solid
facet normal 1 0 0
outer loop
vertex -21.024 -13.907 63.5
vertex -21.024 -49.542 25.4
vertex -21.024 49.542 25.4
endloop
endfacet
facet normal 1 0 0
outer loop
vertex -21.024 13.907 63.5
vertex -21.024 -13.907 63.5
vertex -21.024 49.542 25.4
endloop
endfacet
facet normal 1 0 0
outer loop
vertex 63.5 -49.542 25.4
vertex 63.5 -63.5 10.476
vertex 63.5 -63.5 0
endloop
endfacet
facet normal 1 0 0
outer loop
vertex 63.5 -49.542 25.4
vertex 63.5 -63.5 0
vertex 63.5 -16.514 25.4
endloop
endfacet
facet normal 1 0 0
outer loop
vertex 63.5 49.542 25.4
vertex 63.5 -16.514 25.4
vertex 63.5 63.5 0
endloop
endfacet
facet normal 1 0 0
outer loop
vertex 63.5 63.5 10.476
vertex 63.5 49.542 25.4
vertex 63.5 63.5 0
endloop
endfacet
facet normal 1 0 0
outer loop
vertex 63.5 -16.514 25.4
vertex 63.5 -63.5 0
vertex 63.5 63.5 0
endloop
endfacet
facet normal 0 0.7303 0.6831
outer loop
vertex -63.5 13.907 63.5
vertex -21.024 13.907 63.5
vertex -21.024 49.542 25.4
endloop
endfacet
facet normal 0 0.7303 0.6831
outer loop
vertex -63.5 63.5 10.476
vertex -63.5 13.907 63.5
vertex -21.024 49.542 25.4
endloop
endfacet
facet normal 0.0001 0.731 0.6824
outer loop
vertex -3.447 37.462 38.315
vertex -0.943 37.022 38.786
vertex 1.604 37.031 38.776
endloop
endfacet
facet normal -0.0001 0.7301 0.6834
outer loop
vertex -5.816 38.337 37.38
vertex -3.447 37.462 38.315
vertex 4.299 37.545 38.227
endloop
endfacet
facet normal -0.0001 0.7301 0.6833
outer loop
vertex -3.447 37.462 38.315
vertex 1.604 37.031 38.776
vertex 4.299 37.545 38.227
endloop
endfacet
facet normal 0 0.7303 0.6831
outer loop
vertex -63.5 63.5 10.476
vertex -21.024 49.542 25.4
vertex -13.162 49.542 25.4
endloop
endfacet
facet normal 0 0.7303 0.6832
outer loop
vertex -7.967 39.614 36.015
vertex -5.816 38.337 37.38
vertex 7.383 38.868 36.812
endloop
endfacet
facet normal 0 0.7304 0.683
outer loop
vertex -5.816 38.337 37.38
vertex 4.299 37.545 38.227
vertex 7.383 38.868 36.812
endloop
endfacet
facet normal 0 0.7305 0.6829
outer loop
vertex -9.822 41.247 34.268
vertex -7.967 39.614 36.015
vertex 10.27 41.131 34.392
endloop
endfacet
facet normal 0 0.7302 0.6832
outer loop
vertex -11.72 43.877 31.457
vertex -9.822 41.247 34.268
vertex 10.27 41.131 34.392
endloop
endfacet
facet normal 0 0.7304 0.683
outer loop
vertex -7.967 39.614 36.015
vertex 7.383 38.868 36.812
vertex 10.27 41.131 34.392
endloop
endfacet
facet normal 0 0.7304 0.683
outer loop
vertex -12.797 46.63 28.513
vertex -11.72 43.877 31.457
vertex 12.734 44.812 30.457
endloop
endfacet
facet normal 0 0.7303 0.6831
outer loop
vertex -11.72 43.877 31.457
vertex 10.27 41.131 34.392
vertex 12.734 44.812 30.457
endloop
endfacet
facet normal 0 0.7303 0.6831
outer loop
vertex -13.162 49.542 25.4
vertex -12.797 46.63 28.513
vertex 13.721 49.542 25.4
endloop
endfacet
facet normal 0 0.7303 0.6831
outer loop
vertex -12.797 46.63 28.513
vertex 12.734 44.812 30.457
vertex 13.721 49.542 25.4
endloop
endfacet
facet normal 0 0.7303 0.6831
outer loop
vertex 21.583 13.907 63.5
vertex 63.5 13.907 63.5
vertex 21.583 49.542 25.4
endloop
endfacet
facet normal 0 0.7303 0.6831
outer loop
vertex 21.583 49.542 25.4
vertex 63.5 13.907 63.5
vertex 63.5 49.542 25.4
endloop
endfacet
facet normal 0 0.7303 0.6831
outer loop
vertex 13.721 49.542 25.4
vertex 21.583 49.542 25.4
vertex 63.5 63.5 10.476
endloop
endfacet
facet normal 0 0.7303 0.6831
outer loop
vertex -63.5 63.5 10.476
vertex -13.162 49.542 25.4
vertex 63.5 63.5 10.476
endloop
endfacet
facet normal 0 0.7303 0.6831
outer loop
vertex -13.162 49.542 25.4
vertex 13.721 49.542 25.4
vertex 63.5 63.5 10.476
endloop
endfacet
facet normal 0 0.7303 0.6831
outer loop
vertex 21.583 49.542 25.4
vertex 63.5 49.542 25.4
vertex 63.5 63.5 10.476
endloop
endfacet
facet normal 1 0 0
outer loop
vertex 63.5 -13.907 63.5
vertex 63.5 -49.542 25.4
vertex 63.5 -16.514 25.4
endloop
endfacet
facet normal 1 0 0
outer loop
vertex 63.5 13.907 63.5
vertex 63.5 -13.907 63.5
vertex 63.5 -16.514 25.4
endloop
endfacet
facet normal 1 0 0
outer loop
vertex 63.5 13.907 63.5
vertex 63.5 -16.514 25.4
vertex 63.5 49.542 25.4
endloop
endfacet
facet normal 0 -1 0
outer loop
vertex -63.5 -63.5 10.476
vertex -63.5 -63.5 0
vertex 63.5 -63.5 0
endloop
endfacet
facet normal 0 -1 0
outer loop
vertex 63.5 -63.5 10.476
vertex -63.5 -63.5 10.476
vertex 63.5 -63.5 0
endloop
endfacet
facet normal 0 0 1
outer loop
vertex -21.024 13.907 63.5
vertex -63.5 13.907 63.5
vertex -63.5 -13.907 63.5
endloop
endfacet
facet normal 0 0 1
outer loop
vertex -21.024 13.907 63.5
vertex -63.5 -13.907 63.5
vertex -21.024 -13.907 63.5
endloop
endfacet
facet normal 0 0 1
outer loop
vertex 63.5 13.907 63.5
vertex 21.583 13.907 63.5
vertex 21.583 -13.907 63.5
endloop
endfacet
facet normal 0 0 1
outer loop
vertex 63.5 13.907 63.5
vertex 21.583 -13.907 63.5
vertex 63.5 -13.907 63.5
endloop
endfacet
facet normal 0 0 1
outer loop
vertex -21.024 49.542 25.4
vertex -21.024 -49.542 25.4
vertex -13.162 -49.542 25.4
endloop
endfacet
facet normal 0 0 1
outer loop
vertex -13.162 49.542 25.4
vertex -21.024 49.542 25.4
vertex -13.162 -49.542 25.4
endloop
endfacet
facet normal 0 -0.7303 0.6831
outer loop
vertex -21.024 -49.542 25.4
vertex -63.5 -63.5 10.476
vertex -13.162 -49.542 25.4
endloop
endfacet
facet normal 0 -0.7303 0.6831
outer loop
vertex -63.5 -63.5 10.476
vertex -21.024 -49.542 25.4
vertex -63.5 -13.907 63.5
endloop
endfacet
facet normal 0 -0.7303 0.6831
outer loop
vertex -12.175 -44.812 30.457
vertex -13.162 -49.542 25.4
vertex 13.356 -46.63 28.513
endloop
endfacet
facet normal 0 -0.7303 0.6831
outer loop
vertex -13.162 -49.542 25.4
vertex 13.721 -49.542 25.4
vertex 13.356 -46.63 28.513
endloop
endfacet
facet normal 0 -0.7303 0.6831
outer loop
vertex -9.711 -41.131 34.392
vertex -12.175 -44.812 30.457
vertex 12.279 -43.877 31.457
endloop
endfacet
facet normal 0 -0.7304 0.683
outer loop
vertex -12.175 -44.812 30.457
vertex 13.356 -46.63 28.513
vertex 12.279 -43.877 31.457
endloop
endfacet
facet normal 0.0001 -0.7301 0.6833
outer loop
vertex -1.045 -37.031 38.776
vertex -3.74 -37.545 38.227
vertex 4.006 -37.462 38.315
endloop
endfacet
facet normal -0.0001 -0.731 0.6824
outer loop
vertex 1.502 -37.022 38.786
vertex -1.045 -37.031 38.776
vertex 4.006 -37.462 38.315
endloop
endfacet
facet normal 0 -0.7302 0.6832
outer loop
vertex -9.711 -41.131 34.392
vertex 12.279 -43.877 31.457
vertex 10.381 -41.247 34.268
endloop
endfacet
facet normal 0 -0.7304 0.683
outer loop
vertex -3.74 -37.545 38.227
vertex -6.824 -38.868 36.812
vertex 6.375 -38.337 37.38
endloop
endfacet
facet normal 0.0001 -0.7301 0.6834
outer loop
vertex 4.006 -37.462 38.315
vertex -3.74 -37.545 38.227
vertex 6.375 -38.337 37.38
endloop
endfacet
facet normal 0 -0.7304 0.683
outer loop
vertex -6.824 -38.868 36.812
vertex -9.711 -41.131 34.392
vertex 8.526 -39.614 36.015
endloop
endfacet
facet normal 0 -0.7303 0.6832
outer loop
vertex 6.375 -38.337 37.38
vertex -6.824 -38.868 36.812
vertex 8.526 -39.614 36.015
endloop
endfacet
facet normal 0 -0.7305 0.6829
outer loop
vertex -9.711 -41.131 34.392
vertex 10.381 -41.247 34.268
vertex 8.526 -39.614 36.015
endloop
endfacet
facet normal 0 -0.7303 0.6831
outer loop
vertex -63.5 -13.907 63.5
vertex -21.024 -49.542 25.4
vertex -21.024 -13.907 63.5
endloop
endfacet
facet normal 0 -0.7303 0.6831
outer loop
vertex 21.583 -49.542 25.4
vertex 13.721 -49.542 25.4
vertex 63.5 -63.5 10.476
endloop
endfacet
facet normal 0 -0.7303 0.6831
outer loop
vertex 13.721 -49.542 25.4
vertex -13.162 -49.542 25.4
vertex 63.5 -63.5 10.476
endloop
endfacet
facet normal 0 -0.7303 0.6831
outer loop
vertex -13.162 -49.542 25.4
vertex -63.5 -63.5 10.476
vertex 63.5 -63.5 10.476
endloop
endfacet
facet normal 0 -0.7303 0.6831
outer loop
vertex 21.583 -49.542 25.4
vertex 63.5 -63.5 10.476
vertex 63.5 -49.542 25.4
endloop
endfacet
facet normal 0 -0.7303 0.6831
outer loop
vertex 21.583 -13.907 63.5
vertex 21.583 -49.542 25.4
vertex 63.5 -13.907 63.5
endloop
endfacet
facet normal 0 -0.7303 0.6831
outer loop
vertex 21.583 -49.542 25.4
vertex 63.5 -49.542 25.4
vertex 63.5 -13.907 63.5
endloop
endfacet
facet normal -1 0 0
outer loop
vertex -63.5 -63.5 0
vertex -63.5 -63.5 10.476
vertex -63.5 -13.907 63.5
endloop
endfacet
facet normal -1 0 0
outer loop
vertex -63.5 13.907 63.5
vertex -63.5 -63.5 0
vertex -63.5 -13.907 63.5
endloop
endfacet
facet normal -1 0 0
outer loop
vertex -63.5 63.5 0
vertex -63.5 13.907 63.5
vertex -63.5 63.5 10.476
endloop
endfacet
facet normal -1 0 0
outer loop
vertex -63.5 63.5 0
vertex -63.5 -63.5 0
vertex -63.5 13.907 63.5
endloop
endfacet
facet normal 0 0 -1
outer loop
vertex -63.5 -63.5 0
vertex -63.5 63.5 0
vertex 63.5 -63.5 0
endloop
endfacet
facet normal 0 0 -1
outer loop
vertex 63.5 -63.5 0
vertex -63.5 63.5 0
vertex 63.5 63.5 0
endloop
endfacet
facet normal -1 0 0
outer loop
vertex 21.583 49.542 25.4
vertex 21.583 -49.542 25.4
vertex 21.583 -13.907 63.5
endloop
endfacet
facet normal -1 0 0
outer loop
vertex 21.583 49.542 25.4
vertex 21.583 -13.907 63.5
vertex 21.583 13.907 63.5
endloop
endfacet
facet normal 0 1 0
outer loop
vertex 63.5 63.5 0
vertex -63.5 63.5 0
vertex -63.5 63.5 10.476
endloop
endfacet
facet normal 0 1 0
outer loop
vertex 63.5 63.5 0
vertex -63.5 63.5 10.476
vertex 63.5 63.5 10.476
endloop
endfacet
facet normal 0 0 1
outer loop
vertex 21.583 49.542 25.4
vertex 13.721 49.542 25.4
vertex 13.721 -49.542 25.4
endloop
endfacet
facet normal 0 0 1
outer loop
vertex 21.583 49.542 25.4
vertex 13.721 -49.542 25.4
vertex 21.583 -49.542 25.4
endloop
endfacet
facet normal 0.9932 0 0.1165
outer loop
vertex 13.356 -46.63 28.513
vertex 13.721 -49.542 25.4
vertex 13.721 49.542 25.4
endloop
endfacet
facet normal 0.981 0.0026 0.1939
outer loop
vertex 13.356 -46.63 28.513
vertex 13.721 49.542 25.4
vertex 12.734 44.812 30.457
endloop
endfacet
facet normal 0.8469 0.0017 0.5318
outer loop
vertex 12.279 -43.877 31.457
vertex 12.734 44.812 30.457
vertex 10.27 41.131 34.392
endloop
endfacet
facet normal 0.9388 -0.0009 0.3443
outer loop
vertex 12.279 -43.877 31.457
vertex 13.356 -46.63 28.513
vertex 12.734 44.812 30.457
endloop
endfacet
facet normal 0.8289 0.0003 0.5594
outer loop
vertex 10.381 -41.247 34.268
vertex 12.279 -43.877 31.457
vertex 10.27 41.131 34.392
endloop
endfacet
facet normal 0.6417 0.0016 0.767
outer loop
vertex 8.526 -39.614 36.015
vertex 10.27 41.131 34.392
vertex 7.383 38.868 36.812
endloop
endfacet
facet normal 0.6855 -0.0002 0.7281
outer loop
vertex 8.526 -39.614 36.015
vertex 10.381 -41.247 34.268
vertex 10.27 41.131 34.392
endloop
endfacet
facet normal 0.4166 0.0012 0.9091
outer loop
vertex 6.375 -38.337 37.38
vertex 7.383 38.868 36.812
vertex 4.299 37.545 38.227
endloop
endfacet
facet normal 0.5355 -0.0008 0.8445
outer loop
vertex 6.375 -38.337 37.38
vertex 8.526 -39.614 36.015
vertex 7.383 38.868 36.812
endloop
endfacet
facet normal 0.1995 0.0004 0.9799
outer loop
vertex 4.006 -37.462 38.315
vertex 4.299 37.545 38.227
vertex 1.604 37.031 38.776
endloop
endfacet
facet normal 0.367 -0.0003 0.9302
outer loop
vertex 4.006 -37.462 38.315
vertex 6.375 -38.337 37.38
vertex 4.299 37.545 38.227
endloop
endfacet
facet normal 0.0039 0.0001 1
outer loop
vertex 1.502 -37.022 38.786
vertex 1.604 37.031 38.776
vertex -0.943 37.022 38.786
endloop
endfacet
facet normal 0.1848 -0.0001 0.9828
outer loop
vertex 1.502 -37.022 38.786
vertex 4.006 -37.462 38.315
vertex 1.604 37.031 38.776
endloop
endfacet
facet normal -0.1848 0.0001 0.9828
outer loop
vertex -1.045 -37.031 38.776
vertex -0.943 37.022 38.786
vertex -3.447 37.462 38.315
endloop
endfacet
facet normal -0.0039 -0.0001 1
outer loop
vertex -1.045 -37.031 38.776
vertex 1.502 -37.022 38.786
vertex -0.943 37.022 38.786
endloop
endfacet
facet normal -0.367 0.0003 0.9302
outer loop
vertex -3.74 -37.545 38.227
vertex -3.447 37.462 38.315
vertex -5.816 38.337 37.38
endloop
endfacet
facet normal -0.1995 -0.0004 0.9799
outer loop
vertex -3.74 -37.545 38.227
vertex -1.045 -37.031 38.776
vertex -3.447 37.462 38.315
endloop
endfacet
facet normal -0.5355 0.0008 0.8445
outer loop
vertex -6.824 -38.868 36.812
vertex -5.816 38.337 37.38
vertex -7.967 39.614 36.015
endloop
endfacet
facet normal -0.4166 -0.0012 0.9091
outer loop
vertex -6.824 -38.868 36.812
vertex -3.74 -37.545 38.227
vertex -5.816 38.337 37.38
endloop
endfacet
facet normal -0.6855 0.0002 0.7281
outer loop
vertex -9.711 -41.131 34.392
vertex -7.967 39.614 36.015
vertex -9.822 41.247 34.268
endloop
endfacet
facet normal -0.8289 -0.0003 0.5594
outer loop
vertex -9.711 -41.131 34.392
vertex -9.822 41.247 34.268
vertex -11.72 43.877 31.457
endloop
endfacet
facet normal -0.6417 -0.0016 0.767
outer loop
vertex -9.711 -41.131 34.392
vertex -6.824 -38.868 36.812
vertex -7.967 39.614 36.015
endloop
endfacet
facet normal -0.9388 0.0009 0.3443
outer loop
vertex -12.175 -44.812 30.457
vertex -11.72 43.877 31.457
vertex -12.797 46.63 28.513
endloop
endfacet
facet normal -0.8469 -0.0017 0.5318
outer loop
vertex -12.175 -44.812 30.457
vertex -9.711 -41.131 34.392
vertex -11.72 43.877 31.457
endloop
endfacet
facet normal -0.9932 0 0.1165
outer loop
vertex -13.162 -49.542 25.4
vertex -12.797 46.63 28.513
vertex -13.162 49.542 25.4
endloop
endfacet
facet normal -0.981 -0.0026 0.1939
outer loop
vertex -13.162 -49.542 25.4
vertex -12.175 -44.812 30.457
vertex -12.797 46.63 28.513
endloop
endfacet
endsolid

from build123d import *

# Parameters (mm, degrees)
F1_DEPTH = 25.4
F3_W     = 42.476376
F3_H     = 127
F4_DEPTH = 38.1
F2_W     = 41.917417
F2_H     = 127
F5_DEPTH = 38.1
F7_DEPTH = 127
F9_DEPTH = 127.001


with BuildPart() as f1:
    # F0 (on Top) → F1 (new body)
    with BuildSketch(Plane.XY):
        Polygon((63.5, 63.5), (0, 63.5), (-63.5, 63.5), (-63.5, 0), (-63.5, -63.5), (0, -63.5), (63.5, -63.5), (63.5, 0), align=None)
    extrude(amount=F1_DEPTH)

    # F3 (on face) → F4 (join)
    with BuildSketch(Plane.XY.offset(25.4)):
        with Locations((-42.261812, 0)):
            Rectangle(F3_W, F3_H)
    extrude(amount=F4_DEPTH)

    # F2 (on face) → F5 (join)
    with BuildSketch(Plane.XY.offset(25.4)):
        with Locations((42.541291, 0)):
            Rectangle(F2_W, F2_H)
    extrude(amount=F5_DEPTH)

    # F6 (on face) → F7 (join)
    with BuildSketch(Plane.XZ.offset(63.5)):
        with BuildLine():
            Line((-13.162336, 25.4), (13.721296, 25.4))
            ThreePointArc((13.721296, 25.4), (0.27948, 38.841816), (-13.162336, 25.4))
        make_face()
    extrude(amount=-F7_DEPTH)

    # F8 (on face) → F9 (cut, through all)
    with BuildSketch(Plane.YZ.offset(63.5)):
        Polygon((-63.5, 10.476396), (-13.906721, 63.5), (-63.5, 63.5), align=None)
        Polygon((63.5, 10.476396), (63.5, 63.5), (13.906721, 63.5), align=None)
    extrude(amount=-F9_DEPTH, mode=Mode.SUBTRACT)


solid = f1.part
